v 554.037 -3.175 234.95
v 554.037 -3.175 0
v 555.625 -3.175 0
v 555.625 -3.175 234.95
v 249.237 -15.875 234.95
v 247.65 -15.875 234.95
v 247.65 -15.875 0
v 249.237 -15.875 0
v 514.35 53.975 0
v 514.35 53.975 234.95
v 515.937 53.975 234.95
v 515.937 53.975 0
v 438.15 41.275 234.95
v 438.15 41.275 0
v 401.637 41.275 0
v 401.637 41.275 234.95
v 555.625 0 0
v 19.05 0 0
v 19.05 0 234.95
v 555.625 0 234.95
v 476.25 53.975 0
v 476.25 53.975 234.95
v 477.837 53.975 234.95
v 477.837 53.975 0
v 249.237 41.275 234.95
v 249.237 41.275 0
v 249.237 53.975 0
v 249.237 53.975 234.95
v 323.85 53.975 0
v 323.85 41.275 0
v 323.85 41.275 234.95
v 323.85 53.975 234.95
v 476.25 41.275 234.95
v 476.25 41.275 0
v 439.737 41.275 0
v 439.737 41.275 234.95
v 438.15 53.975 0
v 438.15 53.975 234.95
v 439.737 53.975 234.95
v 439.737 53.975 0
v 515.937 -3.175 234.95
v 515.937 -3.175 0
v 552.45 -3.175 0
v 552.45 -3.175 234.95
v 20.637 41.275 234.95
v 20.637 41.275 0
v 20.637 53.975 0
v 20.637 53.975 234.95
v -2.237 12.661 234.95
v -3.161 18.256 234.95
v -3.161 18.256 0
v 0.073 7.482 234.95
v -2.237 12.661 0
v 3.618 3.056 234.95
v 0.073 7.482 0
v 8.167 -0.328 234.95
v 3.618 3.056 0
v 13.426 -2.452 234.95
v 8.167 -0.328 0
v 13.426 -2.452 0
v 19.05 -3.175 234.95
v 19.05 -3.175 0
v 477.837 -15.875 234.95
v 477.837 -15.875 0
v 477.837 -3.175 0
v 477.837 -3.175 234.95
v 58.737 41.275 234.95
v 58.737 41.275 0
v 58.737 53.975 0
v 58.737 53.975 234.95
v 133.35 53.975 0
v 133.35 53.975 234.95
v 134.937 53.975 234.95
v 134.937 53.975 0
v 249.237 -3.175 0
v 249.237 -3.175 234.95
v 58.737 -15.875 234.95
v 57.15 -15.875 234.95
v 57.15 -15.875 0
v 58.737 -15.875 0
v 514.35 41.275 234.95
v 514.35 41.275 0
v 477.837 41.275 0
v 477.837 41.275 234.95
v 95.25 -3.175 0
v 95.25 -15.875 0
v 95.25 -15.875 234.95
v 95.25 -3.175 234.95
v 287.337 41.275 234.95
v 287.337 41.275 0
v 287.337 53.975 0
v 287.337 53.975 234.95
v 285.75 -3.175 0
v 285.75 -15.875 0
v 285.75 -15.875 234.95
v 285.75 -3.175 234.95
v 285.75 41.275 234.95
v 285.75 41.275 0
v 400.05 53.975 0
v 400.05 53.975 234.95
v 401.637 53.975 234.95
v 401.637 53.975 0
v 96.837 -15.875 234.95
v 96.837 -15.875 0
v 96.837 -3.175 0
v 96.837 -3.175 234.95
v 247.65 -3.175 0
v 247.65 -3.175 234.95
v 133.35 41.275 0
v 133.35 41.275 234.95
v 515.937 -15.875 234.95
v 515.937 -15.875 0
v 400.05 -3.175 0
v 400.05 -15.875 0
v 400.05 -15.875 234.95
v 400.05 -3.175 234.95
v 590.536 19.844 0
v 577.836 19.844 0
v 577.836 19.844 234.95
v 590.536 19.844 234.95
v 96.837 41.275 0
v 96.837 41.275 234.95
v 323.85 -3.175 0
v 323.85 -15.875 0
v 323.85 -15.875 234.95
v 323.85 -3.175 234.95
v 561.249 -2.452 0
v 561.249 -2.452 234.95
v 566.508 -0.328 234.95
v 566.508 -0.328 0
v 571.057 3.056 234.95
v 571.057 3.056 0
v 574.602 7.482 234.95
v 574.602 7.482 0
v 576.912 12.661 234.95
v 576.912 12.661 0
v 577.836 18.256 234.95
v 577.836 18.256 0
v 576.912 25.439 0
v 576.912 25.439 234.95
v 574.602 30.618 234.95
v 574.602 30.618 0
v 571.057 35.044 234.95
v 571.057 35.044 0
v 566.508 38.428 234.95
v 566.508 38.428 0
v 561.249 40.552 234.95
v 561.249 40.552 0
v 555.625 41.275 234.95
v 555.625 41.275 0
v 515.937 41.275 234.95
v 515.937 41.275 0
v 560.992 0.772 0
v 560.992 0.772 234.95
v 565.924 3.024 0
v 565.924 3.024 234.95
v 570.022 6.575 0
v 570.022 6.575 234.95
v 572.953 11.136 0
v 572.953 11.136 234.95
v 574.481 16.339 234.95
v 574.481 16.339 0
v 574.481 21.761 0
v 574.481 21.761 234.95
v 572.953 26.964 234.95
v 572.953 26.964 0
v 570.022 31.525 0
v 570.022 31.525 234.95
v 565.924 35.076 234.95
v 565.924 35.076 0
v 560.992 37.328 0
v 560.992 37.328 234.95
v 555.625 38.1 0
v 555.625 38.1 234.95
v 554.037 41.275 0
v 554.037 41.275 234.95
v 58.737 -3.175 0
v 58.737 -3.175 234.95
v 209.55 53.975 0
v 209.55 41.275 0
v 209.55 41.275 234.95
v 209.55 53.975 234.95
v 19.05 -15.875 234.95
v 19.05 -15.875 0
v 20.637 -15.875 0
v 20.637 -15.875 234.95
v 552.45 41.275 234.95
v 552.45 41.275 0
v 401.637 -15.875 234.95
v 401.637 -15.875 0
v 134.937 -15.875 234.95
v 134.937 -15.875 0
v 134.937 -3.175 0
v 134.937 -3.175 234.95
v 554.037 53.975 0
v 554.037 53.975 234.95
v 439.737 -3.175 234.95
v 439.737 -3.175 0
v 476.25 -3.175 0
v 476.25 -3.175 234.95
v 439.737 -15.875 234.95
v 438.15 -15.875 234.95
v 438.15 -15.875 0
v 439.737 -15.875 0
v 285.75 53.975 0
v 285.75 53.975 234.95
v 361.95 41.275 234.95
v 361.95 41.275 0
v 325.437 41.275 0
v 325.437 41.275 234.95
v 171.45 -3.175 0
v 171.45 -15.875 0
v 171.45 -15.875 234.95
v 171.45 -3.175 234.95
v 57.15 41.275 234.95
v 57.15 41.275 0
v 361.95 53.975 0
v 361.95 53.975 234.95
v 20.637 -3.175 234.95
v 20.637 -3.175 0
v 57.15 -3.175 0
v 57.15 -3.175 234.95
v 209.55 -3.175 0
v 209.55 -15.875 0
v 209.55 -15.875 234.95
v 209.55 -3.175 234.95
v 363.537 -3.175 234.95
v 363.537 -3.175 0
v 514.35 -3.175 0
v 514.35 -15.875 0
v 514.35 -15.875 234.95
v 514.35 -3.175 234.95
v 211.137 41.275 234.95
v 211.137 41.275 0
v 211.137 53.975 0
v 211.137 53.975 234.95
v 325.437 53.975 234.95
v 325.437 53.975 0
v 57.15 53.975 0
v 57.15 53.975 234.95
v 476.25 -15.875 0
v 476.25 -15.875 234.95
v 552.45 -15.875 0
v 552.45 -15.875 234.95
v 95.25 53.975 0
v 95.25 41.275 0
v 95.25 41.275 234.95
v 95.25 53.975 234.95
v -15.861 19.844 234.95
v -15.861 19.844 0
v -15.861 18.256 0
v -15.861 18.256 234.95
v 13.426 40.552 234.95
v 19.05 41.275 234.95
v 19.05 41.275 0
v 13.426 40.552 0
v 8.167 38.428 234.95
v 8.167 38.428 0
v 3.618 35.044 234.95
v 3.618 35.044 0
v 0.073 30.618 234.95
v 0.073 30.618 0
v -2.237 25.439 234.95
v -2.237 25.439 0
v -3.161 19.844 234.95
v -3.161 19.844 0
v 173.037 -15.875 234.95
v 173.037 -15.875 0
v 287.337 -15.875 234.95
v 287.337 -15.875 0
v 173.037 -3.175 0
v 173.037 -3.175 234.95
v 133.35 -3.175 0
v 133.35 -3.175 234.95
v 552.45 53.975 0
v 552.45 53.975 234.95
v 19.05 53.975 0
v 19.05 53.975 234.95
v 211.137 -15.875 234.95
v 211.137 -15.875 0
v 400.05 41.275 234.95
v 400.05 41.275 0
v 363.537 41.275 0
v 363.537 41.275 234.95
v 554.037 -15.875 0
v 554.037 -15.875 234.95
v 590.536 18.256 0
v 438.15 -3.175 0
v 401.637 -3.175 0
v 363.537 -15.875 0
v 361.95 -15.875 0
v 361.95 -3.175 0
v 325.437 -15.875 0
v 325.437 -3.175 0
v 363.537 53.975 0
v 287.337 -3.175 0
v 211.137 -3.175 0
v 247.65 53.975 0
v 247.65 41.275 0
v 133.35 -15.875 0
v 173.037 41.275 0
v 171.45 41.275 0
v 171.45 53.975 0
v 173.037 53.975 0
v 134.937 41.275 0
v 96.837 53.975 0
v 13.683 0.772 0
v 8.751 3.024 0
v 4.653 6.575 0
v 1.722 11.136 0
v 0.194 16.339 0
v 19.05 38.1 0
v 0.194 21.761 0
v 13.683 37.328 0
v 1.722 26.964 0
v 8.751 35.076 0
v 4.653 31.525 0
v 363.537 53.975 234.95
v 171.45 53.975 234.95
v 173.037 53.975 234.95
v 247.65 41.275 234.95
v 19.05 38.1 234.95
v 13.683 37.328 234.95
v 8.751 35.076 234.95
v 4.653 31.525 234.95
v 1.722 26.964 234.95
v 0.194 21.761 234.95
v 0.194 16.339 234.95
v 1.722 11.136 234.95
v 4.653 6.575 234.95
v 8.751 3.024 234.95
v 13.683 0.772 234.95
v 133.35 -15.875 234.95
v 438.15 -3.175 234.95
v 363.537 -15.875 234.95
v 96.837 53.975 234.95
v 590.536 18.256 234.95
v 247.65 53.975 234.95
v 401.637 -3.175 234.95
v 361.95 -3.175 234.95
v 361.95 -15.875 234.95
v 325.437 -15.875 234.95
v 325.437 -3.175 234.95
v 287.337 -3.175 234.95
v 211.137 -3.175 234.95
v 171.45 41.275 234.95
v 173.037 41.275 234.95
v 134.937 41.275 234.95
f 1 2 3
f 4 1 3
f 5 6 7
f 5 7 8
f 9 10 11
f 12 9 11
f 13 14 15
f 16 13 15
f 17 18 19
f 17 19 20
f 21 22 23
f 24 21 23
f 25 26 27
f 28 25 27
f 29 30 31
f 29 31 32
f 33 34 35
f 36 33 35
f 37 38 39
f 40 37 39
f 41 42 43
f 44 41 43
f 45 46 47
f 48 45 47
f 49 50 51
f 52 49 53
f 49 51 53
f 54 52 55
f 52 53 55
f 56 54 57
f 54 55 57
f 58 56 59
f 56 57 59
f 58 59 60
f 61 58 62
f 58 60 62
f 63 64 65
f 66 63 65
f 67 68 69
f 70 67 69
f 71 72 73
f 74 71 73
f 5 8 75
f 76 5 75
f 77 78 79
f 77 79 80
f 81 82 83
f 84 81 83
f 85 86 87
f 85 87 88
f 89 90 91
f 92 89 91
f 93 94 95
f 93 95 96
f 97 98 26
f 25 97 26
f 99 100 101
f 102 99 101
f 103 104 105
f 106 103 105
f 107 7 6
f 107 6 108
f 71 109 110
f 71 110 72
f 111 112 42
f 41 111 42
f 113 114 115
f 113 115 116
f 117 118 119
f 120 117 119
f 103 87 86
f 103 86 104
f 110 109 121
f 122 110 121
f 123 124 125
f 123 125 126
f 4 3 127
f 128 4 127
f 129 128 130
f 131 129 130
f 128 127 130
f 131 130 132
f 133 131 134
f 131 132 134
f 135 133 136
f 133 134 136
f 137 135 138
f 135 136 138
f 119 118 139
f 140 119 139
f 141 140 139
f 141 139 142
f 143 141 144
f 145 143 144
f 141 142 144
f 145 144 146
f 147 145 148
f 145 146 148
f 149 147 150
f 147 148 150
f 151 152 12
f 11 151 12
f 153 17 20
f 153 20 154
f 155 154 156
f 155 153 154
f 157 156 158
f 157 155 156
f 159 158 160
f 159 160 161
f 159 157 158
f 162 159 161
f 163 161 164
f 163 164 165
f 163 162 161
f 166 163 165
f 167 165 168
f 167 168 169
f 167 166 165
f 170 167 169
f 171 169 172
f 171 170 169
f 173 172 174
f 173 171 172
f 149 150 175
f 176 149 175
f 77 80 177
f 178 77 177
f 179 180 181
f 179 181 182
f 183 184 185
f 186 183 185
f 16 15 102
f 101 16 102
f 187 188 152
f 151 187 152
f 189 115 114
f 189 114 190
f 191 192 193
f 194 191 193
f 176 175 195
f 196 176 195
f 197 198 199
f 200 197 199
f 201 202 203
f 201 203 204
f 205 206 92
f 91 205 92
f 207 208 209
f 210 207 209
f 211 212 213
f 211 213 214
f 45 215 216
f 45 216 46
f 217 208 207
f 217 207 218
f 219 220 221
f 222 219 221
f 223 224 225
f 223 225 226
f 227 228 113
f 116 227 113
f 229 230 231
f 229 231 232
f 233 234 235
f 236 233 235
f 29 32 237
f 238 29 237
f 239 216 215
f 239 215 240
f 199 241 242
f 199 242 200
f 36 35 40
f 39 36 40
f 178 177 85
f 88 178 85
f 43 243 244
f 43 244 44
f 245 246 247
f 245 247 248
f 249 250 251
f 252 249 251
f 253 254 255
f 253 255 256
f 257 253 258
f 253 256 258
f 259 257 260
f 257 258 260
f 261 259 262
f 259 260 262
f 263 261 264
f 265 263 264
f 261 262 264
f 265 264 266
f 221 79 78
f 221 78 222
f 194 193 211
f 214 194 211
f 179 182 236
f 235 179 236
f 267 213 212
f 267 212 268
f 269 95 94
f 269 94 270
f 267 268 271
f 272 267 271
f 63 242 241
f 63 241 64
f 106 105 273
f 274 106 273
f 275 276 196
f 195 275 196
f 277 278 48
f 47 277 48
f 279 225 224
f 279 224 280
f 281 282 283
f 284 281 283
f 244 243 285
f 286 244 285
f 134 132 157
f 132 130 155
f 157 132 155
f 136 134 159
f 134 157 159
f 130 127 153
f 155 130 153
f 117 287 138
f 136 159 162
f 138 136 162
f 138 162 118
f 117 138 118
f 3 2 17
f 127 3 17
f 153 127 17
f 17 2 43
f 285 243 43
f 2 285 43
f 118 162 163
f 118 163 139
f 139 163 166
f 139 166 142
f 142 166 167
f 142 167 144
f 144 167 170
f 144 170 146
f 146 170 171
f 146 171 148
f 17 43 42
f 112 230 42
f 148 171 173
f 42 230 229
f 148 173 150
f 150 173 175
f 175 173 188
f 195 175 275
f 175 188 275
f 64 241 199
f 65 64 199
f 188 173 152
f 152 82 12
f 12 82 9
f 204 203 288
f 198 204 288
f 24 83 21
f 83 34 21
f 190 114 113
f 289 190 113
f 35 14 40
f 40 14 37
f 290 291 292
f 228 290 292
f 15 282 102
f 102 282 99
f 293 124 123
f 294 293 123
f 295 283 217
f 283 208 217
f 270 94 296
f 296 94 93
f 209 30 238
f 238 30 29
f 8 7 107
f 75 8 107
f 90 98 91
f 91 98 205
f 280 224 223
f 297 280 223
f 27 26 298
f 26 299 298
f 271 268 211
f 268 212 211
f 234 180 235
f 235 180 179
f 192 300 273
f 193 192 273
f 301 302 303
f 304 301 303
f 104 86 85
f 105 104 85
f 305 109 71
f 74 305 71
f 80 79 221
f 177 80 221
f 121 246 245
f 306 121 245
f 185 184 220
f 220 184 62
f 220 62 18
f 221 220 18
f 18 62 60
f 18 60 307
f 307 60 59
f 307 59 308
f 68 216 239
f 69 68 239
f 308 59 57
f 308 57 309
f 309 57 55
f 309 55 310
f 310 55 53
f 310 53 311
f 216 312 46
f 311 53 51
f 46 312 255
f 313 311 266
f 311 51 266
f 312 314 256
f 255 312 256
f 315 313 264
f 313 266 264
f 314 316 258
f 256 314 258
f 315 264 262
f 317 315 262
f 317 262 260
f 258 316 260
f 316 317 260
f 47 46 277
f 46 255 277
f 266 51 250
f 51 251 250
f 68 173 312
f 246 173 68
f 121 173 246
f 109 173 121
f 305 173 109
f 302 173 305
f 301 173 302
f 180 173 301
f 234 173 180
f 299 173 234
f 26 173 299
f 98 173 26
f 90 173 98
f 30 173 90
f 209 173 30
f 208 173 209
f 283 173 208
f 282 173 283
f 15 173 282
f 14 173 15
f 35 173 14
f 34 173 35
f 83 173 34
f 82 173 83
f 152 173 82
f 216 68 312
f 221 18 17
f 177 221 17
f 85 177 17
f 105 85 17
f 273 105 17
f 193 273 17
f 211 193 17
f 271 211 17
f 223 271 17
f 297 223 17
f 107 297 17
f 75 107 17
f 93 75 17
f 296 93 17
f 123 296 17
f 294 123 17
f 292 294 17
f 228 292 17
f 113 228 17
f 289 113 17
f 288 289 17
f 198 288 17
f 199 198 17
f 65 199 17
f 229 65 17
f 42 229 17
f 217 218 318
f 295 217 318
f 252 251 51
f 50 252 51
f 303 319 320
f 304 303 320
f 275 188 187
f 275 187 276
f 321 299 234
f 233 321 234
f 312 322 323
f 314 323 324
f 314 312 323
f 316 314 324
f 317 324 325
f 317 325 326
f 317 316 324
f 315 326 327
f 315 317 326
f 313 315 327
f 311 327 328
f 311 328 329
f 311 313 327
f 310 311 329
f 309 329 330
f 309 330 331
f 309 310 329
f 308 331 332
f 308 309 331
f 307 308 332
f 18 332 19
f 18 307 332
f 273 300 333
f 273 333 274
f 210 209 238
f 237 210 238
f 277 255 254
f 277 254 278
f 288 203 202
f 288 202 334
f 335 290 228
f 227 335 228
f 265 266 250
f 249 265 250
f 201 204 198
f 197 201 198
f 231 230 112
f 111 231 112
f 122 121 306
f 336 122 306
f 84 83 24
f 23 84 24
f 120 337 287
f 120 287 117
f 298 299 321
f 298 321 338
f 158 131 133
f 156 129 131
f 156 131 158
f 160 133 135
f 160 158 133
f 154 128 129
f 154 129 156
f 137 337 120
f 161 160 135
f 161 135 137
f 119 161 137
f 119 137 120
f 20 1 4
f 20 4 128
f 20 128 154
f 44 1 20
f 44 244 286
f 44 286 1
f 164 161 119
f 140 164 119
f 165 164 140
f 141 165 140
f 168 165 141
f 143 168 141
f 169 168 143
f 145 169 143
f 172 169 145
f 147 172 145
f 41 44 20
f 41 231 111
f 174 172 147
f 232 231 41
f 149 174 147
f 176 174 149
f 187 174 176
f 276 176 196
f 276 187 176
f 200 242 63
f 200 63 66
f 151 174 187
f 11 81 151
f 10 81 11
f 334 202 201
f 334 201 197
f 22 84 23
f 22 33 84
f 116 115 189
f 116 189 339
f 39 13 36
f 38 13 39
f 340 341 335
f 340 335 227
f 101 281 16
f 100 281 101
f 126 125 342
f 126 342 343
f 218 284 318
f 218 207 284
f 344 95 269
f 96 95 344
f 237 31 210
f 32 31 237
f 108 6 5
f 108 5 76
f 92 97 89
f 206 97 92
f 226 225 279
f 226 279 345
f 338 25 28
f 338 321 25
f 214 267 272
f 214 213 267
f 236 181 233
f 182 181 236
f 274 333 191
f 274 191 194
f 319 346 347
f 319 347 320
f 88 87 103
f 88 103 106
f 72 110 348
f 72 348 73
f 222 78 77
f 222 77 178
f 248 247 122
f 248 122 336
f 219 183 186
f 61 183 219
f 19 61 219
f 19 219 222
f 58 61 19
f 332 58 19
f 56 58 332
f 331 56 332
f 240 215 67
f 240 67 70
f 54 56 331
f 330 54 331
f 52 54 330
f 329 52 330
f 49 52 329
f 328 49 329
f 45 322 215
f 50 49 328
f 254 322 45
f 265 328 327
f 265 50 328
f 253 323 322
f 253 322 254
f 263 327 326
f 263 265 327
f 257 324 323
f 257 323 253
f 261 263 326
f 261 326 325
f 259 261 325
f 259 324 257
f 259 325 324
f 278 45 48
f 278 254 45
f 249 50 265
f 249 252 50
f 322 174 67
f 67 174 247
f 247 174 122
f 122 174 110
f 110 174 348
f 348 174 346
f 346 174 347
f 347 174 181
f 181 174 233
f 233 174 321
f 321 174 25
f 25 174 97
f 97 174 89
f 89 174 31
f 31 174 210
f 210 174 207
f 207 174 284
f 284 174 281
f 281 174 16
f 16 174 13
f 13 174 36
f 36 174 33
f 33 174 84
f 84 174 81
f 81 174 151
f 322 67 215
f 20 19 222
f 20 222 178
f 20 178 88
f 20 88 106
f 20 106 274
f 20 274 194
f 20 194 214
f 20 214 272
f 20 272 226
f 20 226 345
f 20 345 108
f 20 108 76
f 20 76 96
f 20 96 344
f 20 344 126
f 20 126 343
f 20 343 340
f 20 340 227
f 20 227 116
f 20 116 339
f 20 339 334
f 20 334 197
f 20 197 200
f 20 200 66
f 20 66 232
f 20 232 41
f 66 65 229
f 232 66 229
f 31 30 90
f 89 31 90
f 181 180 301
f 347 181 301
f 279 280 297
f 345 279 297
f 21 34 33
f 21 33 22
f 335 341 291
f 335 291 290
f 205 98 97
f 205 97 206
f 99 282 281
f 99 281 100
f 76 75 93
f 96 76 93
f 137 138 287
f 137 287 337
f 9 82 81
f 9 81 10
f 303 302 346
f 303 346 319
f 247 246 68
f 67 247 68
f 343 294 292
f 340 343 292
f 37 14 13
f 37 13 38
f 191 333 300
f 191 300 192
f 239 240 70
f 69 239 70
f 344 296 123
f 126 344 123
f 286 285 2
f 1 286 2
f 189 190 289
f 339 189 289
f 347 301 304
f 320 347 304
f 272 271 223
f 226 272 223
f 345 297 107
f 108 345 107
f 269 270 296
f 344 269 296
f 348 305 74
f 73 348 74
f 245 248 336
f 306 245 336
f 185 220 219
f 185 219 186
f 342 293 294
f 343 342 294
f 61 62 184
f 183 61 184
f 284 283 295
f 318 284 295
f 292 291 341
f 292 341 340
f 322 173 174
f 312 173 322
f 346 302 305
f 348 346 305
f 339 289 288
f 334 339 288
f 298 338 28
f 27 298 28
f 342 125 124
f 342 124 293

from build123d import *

# Parameters (mm, degrees)
BOSS_EXTRUDE1_DEPTH      = 234.95
SKETCH3_W                = 1.5875
SKETCH3_H                = 12.7
BOSS_EXTRUDE3_DEPTH      = 234.95
LPATTERN1_COUNT          = 15
LPATTERN1_PITCH          = 38.1
MIRROR1_COPY_1_SKETCH_W  = 1.5875
MIRROR1_COPY_1_SKETCH_H  = 12.7
MIRROR1_COPY_1_DEPTH     = 234.95
MIRROR1_COPY_2_SKETCH_W  = 1.5875
MIRROR1_COPY_2_SKETCH_H  = 12.7
MIRROR1_COPY_2_DEPTH     = 234.95
MIRROR1_COPY_3_SKETCH_W  = 1.5875
MIRROR1_COPY_3_SKETCH_H  = 12.7
MIRROR1_COPY_3_DEPTH     = 234.95
MIRROR1_COPY_4_SKETCH_W  = 1.5875
MIRROR1_COPY_4_SKETCH_H  = 12.7
MIRROR1_COPY_4_DEPTH     = 234.95
MIRROR1_COPY_5_SKETCH_W  = 1.5875
MIRROR1_COPY_5_SKETCH_H  = 12.7
MIRROR1_COPY_5_DEPTH     = 234.95
MIRROR1_COPY_6_SKETCH_W  = 1.5875
MIRROR1_COPY_6_SKETCH_H  = 12.7
MIRROR1_COPY_6_DEPTH     = 234.95
MIRROR1_COPY_7_SKETCH_W  = 1.5875
MIRROR1_COPY_7_SKETCH_H  = 12.7
MIRROR1_COPY_7_DEPTH     = 234.95
MIRROR1_COPY_8_SKETCH_W  = 1.5875
MIRROR1_COPY_8_SKETCH_H  = 12.7
MIRROR1_COPY_8_DEPTH     = 234.95
MIRROR1_COPY_9_SKETCH_W  = 1.5875
MIRROR1_COPY_9_SKETCH_H  = 12.7
MIRROR1_COPY_9_DEPTH     = 234.95
MIRROR1_COPY_10_SKETCH_W = 1.5875
MIRROR1_COPY_10_SKETCH_H = 12.7
MIRROR1_COPY_10_DEPTH    = 234.95
MIRROR1_COPY_11_SKETCH_W = 1.5875
MIRROR1_COPY_11_SKETCH_H = 12.7
MIRROR1_COPY_11_DEPTH    = 234.95
MIRROR1_COPY_12_SKETCH_W = 1.5875
MIRROR1_COPY_12_SKETCH_H = 12.7
MIRROR1_COPY_12_DEPTH    = 234.95
MIRROR1_COPY_13_SKETCH_W = 1.5875
MIRROR1_COPY_13_SKETCH_H = 12.7
MIRROR1_COPY_13_DEPTH    = 234.95
MIRROR1_COPY_14_SKETCH_W = 1.5875
MIRROR1_COPY_14_SKETCH_H = 12.7
MIRROR1_COPY_14_DEPTH    = 234.95
BOSS_EXTRUDE4_DEPTH      = 234.95
MIRROR2_START            = 577.835817532
MIRROR2_OUTLINE_W        = 1.5875
MIRROR2_OUTLINE_H        = 234.95
MIRROR2_DEPTH            = 12.700003838


# Read off the part's stored shape, not the designer's step: Mirror2
with BuildPart() as part:
    # Sketch1 → Boss-Extrude1 (new body)
    with BuildSketch(Plane.XY):
        with BuildLine():
            Line((19.050003843, -3.175), (555.624996157, -3.175))
            ThreePointArc((555.624996157, -3.175), (577.849996157, 19.05), (555.624996157, 41.275))
            Line((555.624996157, 41.275), (19.049996157, 41.275))
            ThreePointArc((19.049996157, 41.275), (-3.175, 19.049996157), (19.050003843, -3.175))
        make_face()
        with BuildLine():
            Line((19.049996157, 0), (555.624996157, 0))
            ThreePointArc((555.624996157, 0), (574.674996157, 19.05), (555.624996157, 38.1))
            Line((555.624996157, 38.1), (19.050000909, 38.1))
            ThreePointArc((19.050000909, 38.1), (0, 19.050002376), (19.049996157, 0))
        make_face(mode=Mode.SUBTRACT)
    extrude(amount=BOSS_EXTRUDE1_DEPTH)

    # Sketch3 → Boss-Extrude3 (add)
    with BuildSketch(Plane.XY):
        with Locations((19.843746157, 47.625)):
            Rectangle(SKETCH3_W, SKETCH3_H)
    boss_extrude3 = extrude(amount=BOSS_EXTRUDE3_DEPTH)

    # LPattern1: Boss-Extrude3 ×15
    with Locations(*[(i * LPATTERN1_PITCH, 0, 0) for i in range(1, LPATTERN1_COUNT)]):
        add(boss_extrude3)

    # Mirror1: Boss-Extrude3 across plane
    add(boss_extrude3.mirror(Plane.ZX.offset(19.05)))

    # Mirror1 copy 1 sketch → Mirror1 copy 1 (add)
    with BuildSketch(Plane(origin=(38.1, 38.1, 0), x_dir=(1, 0, 0), z_dir=(0, 0, 1))):
        with Locations((19.843746157, -47.625)):
            Rectangle(MIRROR1_COPY_1_SKETCH_W, MIRROR1_COPY_1_SKETCH_H)
    extrude(amount=MIRROR1_COPY_1_DEPTH)

    # Mirror1 copy 2 sketch → Mirror1 copy 2 (add)
    with BuildSketch(Plane(origin=(76.2, 38.1, 0), x_dir=(1, 0, 0), z_dir=(0, 0, 1))):
        with Locations((19.843746157, -47.625)):
            Rectangle(MIRROR1_COPY_2_SKETCH_W, MIRROR1_COPY_2_SKETCH_H)
    extrude(amount=MIRROR1_COPY_2_DEPTH)

    # Mirror1 copy 3 sketch → Mirror1 copy 3 (add)
    with BuildSketch(Plane(origin=(114.3, 38.1, 0), x_dir=(1, 0, 0), z_dir=(0, 0, 1))):
        with Locations((19.843746157, -47.625)):
            Rectangle(MIRROR1_COPY_3_SKETCH_W, MIRROR1_COPY_3_SKETCH_H)
    extrude(amount=MIRROR1_COPY_3_DEPTH)

    # Mirror1 copy 4 sketch → Mirror1 copy 4 (add)
    with BuildSketch(Plane(origin=(152.4, 38.1, 0), x_dir=(1, 0, 0), z_dir=(0, 0, 1))):
        with Locations((19.843746157, -47.625)):
            Rectangle(MIRROR1_COPY_4_SKETCH_W, MIRROR1_COPY_4_SKETCH_H)
    extrude(amount=MIRROR1_COPY_4_DEPTH)

    # Mirror1 copy 5 sketch → Mirror1 copy 5 (add)
    with BuildSketch(Plane(origin=(190.5, 38.1, 0), x_dir=(1, 0, 0), z_dir=(0, 0, 1))):
        with Locations((19.843746157, -47.625)):
            Rectangle(MIRROR1_COPY_5_SKETCH_W, MIRROR1_COPY_5_SKETCH_H)
    extrude(amount=MIRROR1_COPY_5_DEPTH)

    # Mirror1 copy 6 sketch → Mirror1 copy 6 (add)
    with BuildSketch(Plane(origin=(228.6, 38.1, 0), x_dir=(1, 0, 0), z_dir=(0, 0, 1))):
        with Locations((19.843746157, -47.625)):
            Rectangle(MIRROR1_COPY_6_SKETCH_W, MIRROR1_COPY_6_SKETCH_H)
    extrude(amount=MIRROR1_COPY_6_DEPTH)

    # Mirror1 copy 7 sketch → Mirror1 copy 7 (add)
    with BuildSketch(Plane(origin=(266.7, 38.1, 0), x_dir=(1, 0, 0), z_dir=(0, 0, 1))):
        with Locations((19.843746157, -47.625)):
            Rectangle(MIRROR1_COPY_7_SKETCH_W, MIRROR1_COPY_7_SKETCH_H)
    extrude(amount=MIRROR1_COPY_7_DEPTH)

    # Mirror1 copy 8 sketch → Mirror1 copy 8 (add)
    with BuildSketch(Plane(origin=(304.8, 38.1, 0), x_dir=(1, 0, 0), z_dir=(0, 0, 1))):
        with Locations((19.843746157, -47.625)):
            Rectangle(MIRROR1_COPY_8_SKETCH_W, MIRROR1_COPY_8_SKETCH_H)
    extrude(amount=MIRROR1_COPY_8_DEPTH)

    # Mirror1 copy 9 sketch → Mirror1 copy 9 (add)
    with BuildSketch(Plane(origin=(342.9, 38.1, 0), x_dir=(1, 0, 0), z_dir=(0, 0, 1))):
        with Locations((19.843746157, -47.625)):
            Rectangle(MIRROR1_COPY_9_SKETCH_W, MIRROR1_COPY_9_SKETCH_H)
    extrude(amount=MIRROR1_COPY_9_DEPTH)

    # Mirror1 copy 10 sketch → Mirror1 copy 10 (add)
    with BuildSketch(Plane(origin=(381, 38.1, 0), x_dir=(1, 0, 0), z_dir=(0, 0, 1))):
        with Locations((19.843746157, -47.625)):
            Rectangle(MIRROR1_COPY_10_SKETCH_W, MIRROR1_COPY_10_SKETCH_H)
    extrude(amount=MIRROR1_COPY_10_DEPTH)

    # Mirror1 copy 11 sketch → Mirror1 copy 11 (add)
    with BuildSketch(Plane(origin=(419.1, 38.1, 0), x_dir=(1, 0, 0), z_dir=(0, 0, 1))):
        with Locations((19.843746157, -47.625)):
            Rectangle(MIRROR1_COPY_11_SKETCH_W, MIRROR1_COPY_11_SKETCH_H)
    extrude(amount=MIRROR1_COPY_11_DEPTH)

    # Mirror1 copy 12 sketch → Mirror1 copy 12 (add)
    with BuildSketch(Plane(origin=(457.2, 38.1, 0), x_dir=(1, 0, 0), z_dir=(0, 0, 1))):
        with Locations((19.843746157, -47.625)):
            Rectangle(MIRROR1_COPY_12_SKETCH_W, MIRROR1_COPY_12_SKETCH_H)
    extrude(amount=MIRROR1_COPY_12_DEPTH)

    # Mirror1 copy 13 sketch → Mirror1 copy 13 (add)
    with BuildSketch(Plane(origin=(495.3, 38.1, 0), x_dir=(1, 0, 0), z_dir=(0, 0, 1))):
        with Locations((19.843746157, -47.625)):
            Rectangle(MIRROR1_COPY_13_SKETCH_W, MIRROR1_COPY_13_SKETCH_H)
    extrude(amount=MIRROR1_COPY_13_DEPTH)

    # Mirror1 copy 14 sketch → Mirror1 copy 14 (add)
    with BuildSketch(Plane(origin=(533.4, 38.1, 0), x_dir=(1, 0, 0), z_dir=(0, 0, 1))):
        with Locations((19.843746157, -47.625)):
            Rectangle(MIRROR1_COPY_14_SKETCH_W, MIRROR1_COPY_14_SKETCH_H)
    extrude(amount=MIRROR1_COPY_14_DEPTH)

    # Sketch4 → Boss-Extrude4 (add)
    with BuildSketch(Plane.XY):
        with BuildLine():
            Line((-3.16082137, 19.84375), (-15.86082137, 19.84375))
            Line((-15.86082137, 19.84375), (-15.86082137, 18.25625))
            Line((-15.86082137, 18.25625), (-3.16082137, 18.25625))
            ThreePointArc((-3.16082137, 18.25625), (-3.175, 19.05), (-3.16082137, 19.84375))
        make_face()
    extrude(amount=BOSS_EXTRUDE4_DEPTH)

    # Mirror2 outline → Mirror2 (add)
    with BuildSketch(Plane.YZ.offset(MIRROR2_START)):
        with Locations((19.05, 117.475)):
            Rectangle(MIRROR2_OUTLINE_W, MIRROR2_OUTLINE_H)
    extrude(amount=MIRROR2_DEPTH)


solid = part.part
